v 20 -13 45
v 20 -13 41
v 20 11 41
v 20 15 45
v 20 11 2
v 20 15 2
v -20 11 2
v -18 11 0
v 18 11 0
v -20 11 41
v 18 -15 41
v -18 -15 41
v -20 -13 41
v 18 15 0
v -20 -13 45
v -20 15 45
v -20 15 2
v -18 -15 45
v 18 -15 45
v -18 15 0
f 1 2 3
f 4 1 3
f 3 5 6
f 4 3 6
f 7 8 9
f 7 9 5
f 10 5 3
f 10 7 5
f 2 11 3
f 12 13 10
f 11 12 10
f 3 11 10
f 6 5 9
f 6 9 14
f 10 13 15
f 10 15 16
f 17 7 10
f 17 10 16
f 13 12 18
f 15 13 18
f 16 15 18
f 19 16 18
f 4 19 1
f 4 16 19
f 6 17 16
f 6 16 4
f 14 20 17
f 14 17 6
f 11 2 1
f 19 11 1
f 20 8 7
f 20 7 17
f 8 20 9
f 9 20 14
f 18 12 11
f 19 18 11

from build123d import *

# Parameters (mm, degrees)
SKETCH_1_W          = 40
SKETCH_1_H          = 30
EXTRUDE_1_DEPTH     = 45
SKETCH_6_W          = 41
SKETCH_6_H          = 26
CUT_EXTRUDE_1_DEPTH = 41
CHAMFER_1_SIZE      = 2


with BuildPart() as part:
    # 草图1 → 凸台-拉伸1 (new body)
    with BuildSketch(Plane.XY):
        Rectangle(SKETCH_1_W, SKETCH_1_H)
    extrude(amount=EXTRUDE_1_DEPTH)

    # 草图6 → 切除-拉伸1 (cut, through all)
    with BuildSketch(Plane.ZY.offset(20)):
        with Locations((20.5, -2)):
            Rectangle(SKETCH_6_W, SKETCH_6_H)
    extrude(amount=-CUT_EXTRUDE_1_DEPTH, mode=Mode.SUBTRACT)

    # 倒角1
    chamfer_1_edges = [part.edges().sort_by_distance(p)[0] for p in [
        (20, 13, 0),
        (-20, 13, 0),
        (20, -15, 43),
        (-20, -15, 43),
    ]]
    chamfer(chamfer_1_edges, length=CHAMFER_1_SIZE)


solid = part.part
